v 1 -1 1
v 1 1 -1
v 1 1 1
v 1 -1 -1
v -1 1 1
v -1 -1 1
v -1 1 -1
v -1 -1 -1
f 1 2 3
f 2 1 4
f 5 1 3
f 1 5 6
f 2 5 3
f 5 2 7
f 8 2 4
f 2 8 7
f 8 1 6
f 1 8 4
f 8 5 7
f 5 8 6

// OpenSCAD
// tranformation matrices should consist of all -1, 0, and 1 values
for(mx=[0,1],my=[0,1],mz=[0,1]) {
  m = [mx,my,mz];
  if (m == [1,1,1]) scale(-1) cube(); // can't mirror all 3 axes with single mirror operation
  else mirror(m) cube();
}
